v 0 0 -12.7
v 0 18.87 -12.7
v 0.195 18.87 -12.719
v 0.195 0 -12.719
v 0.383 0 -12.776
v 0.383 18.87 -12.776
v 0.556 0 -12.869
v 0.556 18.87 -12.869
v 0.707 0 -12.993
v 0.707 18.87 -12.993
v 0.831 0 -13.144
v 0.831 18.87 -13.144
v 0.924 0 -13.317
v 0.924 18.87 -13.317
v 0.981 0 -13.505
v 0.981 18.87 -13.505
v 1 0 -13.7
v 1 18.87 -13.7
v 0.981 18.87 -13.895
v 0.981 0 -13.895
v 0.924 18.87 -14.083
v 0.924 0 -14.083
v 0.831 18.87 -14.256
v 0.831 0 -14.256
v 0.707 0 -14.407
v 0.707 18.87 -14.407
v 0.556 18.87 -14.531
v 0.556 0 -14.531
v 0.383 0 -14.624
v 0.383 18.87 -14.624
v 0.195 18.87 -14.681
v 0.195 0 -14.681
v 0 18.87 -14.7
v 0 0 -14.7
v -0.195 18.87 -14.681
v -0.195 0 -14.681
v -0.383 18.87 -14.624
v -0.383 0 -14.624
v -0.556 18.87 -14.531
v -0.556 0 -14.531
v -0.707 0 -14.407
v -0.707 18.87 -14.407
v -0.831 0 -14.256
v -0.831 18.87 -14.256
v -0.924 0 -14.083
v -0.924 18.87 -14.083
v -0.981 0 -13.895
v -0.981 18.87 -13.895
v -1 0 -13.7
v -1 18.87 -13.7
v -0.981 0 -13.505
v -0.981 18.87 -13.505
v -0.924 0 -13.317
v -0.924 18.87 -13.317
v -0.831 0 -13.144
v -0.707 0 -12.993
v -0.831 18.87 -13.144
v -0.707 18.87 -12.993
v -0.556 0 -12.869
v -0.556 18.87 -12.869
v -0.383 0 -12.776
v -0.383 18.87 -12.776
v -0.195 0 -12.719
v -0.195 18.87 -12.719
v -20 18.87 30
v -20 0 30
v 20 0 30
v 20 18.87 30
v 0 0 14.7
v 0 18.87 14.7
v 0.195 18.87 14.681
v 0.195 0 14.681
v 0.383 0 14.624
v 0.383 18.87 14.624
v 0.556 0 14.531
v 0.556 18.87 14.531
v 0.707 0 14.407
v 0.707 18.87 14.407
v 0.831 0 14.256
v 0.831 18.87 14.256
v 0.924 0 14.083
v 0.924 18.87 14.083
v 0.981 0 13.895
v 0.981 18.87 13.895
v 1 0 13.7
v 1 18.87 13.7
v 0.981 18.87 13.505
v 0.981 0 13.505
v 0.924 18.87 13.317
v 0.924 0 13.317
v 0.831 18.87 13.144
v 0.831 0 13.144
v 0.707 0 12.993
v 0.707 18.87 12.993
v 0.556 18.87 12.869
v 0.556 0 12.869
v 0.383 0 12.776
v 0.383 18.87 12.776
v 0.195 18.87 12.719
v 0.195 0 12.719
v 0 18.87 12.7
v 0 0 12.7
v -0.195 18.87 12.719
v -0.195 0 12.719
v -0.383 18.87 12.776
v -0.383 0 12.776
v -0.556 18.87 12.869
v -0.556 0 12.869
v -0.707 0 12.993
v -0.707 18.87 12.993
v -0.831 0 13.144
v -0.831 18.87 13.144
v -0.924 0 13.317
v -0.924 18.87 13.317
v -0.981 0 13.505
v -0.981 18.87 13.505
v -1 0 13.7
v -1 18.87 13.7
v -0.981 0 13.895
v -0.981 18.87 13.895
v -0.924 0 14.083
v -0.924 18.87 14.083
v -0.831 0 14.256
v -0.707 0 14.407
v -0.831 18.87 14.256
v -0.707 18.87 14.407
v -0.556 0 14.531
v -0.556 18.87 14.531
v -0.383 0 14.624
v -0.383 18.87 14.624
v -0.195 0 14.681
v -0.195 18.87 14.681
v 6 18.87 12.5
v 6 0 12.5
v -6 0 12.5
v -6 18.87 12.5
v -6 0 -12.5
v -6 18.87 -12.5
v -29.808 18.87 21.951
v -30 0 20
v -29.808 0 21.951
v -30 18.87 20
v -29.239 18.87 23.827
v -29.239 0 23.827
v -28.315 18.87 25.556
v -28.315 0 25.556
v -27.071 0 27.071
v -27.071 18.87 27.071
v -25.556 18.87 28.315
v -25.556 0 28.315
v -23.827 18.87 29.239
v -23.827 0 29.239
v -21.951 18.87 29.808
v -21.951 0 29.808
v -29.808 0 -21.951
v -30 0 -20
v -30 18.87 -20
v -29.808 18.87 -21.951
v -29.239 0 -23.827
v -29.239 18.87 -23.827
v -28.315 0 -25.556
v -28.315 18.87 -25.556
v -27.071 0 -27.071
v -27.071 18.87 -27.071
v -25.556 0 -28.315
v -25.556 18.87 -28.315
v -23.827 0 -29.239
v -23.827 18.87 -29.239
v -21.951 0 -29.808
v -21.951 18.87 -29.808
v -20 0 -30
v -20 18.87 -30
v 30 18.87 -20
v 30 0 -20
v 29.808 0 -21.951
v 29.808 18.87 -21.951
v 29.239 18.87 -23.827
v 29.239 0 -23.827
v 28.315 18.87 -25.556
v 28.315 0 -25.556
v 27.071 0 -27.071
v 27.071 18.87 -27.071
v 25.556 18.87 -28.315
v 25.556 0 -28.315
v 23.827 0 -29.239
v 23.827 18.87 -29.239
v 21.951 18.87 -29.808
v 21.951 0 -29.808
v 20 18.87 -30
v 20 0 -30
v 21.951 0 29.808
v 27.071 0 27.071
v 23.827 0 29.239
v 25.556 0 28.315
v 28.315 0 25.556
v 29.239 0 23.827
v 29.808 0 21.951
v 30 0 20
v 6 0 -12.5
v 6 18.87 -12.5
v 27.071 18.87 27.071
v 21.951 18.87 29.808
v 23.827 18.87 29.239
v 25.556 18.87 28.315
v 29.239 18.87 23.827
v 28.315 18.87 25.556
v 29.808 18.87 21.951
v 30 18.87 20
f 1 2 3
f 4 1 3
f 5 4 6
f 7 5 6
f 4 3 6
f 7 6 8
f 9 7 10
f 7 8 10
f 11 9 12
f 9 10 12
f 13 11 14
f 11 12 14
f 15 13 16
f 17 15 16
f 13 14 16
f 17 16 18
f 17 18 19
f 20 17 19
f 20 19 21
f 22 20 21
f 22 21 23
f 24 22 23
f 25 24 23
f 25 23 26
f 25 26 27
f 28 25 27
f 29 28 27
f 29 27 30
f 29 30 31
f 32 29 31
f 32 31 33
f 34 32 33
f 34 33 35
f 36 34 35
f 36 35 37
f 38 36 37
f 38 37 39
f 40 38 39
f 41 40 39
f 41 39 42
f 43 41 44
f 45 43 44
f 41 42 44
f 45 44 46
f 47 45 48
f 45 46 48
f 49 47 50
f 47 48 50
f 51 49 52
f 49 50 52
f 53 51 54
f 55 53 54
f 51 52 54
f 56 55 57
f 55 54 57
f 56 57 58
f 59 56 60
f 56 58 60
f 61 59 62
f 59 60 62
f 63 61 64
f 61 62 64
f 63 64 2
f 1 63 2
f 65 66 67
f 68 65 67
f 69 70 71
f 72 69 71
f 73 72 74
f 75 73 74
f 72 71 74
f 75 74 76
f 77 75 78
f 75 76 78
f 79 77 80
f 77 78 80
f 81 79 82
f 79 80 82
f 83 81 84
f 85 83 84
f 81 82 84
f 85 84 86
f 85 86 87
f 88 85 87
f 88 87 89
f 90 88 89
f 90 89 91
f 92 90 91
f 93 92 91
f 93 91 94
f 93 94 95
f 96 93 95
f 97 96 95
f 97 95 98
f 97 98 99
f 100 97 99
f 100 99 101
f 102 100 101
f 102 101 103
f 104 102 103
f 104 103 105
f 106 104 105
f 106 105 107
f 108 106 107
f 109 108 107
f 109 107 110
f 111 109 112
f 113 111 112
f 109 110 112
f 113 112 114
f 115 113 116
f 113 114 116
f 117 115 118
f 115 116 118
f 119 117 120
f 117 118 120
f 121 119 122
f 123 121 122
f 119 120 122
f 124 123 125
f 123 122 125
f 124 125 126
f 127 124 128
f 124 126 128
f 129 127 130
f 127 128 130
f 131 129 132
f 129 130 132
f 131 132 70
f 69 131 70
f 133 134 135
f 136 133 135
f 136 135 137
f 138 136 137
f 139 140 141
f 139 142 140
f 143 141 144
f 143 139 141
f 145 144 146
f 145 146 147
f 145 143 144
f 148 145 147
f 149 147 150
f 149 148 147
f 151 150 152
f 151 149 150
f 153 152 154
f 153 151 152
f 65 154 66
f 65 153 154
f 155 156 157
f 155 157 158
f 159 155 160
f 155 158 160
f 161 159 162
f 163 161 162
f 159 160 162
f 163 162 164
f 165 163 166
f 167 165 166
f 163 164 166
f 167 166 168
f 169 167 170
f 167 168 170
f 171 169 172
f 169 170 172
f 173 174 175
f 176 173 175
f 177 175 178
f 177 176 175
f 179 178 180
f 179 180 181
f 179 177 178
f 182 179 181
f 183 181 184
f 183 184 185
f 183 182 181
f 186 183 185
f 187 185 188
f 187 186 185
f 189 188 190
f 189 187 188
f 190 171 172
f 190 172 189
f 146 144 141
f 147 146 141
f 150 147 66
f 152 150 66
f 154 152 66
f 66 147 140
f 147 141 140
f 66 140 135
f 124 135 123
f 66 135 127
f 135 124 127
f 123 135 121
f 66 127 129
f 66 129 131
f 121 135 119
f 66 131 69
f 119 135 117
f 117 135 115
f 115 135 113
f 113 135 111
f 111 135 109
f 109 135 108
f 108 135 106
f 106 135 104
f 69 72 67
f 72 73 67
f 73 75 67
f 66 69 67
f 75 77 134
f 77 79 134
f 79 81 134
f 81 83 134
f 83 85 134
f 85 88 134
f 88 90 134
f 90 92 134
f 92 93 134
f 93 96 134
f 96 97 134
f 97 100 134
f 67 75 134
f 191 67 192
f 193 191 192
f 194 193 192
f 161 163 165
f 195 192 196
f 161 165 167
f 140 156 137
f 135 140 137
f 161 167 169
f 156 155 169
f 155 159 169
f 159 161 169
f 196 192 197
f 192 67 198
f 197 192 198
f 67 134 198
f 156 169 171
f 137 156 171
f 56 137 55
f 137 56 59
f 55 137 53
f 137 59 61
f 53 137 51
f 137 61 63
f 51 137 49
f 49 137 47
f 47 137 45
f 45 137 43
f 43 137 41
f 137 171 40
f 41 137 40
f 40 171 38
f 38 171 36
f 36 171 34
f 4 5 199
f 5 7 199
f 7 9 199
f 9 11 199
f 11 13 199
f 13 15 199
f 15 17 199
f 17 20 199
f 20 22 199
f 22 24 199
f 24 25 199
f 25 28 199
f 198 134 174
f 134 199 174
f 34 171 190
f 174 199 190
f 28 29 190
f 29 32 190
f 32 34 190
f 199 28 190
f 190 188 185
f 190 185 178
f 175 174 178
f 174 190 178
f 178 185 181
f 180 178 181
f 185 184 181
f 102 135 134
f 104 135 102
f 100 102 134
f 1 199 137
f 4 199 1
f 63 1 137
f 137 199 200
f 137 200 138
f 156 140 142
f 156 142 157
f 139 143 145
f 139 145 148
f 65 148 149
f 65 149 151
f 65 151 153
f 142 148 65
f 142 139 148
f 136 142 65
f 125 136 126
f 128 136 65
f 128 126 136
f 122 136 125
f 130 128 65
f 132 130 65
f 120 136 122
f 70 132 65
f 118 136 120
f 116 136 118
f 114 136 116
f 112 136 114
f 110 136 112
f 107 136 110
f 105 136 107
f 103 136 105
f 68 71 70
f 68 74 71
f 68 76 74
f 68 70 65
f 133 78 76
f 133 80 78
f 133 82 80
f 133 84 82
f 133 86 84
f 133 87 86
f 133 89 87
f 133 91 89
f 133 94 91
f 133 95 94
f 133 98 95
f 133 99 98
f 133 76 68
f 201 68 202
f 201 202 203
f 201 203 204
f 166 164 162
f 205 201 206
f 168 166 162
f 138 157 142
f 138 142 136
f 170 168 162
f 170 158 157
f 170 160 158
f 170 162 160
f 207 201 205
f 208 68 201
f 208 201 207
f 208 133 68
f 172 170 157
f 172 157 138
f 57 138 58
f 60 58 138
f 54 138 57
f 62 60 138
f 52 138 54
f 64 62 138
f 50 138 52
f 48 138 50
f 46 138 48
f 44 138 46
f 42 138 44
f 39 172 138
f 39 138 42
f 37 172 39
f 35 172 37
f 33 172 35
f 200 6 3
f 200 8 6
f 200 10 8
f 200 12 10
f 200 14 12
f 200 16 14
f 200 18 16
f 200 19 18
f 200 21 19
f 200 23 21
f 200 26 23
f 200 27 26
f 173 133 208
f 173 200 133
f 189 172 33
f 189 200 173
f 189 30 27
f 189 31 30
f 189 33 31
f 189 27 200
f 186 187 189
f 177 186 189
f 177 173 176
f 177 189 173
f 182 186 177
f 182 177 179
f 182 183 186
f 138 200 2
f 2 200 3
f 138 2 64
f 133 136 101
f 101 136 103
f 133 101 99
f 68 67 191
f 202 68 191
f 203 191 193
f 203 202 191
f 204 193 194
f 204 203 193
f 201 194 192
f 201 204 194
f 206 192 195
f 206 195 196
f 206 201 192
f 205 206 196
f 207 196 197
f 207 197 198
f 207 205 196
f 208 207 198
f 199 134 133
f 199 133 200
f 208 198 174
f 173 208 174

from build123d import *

# Parameters (mm, degrees)
SKETCH1_W           = 60
SKETCH1_H           = 60
BOSS_EXTRUDE1_DEPTH = 18.87
FILLET1_R           = 10
SKETCH3_W           = 12
SKETCH3_H           = 25
CUT_EXTRUDE1_DEPTH  = 47.433575137
SKETCH5_R           = 1
CUT_EXTRUDE2_DEPTH  = 47.433575137
SKETCH8_R           = 1
CUT_EXTRUDE3_DEPTH  = 47.433575137


with BuildPart() as part:
    # Sketch1 → Boss-Extrude1 (new body)
    with BuildSketch(Plane(origin=(0, 0, 0), x_dir=(1, 0, 0), z_dir=(0, 1, 0))):
        Rectangle(SKETCH1_W, SKETCH1_H)
    extrude(amount=BOSS_EXTRUDE1_DEPTH)

    # Fillet1
    fillet1_edges = [part.edges().sort_by_distance(p)[0] for p in [
        (-30, 9.435, 30),
        (30, 9.435, 30),
        (30, 9.435, -30),
        (-30, 9.435, -30),
    ]]
    fillet(fillet1_edges, radius=FILLET1_R)

    # Sketch3 → Cut-Extrude1 (cut, through all)
    with BuildSketch(Plane(origin=(0, 0, 0), x_dir=(-1, 0, 0), z_dir=(0, -1, 0))):
        Rectangle(SKETCH3_W, SKETCH3_H)
    extrude(amount=-CUT_EXTRUDE1_DEPTH, mode=Mode.SUBTRACT)

    # Sketch5 → Cut-Extrude2 (cut, through all)
    with BuildSketch(Plane(origin=(0, 18.87, 0), x_dir=(1, 0, 0), z_dir=(0, 1, 0))):
        with Locations(Location((0, 13.7, 0), (0, 0, 270))):
            Circle(SKETCH5_R)
    extrude(amount=-CUT_EXTRUDE2_DEPTH, mode=Mode.SUBTRACT)

    # Sketch8 → Cut-Extrude3 (cut, through all)
    with BuildSketch(Plane(origin=(0, 18.87, 0), x_dir=(1, 0, 0), z_dir=(0, 1, 0))):
        with Locations(Location((0, -13.7, 0), (0, 0, 270))):
            Circle(SKETCH8_R)
    extrude(amount=-CUT_EXTRUDE3_DEPTH, mode=Mode.SUBTRACT)


solid = part.part
